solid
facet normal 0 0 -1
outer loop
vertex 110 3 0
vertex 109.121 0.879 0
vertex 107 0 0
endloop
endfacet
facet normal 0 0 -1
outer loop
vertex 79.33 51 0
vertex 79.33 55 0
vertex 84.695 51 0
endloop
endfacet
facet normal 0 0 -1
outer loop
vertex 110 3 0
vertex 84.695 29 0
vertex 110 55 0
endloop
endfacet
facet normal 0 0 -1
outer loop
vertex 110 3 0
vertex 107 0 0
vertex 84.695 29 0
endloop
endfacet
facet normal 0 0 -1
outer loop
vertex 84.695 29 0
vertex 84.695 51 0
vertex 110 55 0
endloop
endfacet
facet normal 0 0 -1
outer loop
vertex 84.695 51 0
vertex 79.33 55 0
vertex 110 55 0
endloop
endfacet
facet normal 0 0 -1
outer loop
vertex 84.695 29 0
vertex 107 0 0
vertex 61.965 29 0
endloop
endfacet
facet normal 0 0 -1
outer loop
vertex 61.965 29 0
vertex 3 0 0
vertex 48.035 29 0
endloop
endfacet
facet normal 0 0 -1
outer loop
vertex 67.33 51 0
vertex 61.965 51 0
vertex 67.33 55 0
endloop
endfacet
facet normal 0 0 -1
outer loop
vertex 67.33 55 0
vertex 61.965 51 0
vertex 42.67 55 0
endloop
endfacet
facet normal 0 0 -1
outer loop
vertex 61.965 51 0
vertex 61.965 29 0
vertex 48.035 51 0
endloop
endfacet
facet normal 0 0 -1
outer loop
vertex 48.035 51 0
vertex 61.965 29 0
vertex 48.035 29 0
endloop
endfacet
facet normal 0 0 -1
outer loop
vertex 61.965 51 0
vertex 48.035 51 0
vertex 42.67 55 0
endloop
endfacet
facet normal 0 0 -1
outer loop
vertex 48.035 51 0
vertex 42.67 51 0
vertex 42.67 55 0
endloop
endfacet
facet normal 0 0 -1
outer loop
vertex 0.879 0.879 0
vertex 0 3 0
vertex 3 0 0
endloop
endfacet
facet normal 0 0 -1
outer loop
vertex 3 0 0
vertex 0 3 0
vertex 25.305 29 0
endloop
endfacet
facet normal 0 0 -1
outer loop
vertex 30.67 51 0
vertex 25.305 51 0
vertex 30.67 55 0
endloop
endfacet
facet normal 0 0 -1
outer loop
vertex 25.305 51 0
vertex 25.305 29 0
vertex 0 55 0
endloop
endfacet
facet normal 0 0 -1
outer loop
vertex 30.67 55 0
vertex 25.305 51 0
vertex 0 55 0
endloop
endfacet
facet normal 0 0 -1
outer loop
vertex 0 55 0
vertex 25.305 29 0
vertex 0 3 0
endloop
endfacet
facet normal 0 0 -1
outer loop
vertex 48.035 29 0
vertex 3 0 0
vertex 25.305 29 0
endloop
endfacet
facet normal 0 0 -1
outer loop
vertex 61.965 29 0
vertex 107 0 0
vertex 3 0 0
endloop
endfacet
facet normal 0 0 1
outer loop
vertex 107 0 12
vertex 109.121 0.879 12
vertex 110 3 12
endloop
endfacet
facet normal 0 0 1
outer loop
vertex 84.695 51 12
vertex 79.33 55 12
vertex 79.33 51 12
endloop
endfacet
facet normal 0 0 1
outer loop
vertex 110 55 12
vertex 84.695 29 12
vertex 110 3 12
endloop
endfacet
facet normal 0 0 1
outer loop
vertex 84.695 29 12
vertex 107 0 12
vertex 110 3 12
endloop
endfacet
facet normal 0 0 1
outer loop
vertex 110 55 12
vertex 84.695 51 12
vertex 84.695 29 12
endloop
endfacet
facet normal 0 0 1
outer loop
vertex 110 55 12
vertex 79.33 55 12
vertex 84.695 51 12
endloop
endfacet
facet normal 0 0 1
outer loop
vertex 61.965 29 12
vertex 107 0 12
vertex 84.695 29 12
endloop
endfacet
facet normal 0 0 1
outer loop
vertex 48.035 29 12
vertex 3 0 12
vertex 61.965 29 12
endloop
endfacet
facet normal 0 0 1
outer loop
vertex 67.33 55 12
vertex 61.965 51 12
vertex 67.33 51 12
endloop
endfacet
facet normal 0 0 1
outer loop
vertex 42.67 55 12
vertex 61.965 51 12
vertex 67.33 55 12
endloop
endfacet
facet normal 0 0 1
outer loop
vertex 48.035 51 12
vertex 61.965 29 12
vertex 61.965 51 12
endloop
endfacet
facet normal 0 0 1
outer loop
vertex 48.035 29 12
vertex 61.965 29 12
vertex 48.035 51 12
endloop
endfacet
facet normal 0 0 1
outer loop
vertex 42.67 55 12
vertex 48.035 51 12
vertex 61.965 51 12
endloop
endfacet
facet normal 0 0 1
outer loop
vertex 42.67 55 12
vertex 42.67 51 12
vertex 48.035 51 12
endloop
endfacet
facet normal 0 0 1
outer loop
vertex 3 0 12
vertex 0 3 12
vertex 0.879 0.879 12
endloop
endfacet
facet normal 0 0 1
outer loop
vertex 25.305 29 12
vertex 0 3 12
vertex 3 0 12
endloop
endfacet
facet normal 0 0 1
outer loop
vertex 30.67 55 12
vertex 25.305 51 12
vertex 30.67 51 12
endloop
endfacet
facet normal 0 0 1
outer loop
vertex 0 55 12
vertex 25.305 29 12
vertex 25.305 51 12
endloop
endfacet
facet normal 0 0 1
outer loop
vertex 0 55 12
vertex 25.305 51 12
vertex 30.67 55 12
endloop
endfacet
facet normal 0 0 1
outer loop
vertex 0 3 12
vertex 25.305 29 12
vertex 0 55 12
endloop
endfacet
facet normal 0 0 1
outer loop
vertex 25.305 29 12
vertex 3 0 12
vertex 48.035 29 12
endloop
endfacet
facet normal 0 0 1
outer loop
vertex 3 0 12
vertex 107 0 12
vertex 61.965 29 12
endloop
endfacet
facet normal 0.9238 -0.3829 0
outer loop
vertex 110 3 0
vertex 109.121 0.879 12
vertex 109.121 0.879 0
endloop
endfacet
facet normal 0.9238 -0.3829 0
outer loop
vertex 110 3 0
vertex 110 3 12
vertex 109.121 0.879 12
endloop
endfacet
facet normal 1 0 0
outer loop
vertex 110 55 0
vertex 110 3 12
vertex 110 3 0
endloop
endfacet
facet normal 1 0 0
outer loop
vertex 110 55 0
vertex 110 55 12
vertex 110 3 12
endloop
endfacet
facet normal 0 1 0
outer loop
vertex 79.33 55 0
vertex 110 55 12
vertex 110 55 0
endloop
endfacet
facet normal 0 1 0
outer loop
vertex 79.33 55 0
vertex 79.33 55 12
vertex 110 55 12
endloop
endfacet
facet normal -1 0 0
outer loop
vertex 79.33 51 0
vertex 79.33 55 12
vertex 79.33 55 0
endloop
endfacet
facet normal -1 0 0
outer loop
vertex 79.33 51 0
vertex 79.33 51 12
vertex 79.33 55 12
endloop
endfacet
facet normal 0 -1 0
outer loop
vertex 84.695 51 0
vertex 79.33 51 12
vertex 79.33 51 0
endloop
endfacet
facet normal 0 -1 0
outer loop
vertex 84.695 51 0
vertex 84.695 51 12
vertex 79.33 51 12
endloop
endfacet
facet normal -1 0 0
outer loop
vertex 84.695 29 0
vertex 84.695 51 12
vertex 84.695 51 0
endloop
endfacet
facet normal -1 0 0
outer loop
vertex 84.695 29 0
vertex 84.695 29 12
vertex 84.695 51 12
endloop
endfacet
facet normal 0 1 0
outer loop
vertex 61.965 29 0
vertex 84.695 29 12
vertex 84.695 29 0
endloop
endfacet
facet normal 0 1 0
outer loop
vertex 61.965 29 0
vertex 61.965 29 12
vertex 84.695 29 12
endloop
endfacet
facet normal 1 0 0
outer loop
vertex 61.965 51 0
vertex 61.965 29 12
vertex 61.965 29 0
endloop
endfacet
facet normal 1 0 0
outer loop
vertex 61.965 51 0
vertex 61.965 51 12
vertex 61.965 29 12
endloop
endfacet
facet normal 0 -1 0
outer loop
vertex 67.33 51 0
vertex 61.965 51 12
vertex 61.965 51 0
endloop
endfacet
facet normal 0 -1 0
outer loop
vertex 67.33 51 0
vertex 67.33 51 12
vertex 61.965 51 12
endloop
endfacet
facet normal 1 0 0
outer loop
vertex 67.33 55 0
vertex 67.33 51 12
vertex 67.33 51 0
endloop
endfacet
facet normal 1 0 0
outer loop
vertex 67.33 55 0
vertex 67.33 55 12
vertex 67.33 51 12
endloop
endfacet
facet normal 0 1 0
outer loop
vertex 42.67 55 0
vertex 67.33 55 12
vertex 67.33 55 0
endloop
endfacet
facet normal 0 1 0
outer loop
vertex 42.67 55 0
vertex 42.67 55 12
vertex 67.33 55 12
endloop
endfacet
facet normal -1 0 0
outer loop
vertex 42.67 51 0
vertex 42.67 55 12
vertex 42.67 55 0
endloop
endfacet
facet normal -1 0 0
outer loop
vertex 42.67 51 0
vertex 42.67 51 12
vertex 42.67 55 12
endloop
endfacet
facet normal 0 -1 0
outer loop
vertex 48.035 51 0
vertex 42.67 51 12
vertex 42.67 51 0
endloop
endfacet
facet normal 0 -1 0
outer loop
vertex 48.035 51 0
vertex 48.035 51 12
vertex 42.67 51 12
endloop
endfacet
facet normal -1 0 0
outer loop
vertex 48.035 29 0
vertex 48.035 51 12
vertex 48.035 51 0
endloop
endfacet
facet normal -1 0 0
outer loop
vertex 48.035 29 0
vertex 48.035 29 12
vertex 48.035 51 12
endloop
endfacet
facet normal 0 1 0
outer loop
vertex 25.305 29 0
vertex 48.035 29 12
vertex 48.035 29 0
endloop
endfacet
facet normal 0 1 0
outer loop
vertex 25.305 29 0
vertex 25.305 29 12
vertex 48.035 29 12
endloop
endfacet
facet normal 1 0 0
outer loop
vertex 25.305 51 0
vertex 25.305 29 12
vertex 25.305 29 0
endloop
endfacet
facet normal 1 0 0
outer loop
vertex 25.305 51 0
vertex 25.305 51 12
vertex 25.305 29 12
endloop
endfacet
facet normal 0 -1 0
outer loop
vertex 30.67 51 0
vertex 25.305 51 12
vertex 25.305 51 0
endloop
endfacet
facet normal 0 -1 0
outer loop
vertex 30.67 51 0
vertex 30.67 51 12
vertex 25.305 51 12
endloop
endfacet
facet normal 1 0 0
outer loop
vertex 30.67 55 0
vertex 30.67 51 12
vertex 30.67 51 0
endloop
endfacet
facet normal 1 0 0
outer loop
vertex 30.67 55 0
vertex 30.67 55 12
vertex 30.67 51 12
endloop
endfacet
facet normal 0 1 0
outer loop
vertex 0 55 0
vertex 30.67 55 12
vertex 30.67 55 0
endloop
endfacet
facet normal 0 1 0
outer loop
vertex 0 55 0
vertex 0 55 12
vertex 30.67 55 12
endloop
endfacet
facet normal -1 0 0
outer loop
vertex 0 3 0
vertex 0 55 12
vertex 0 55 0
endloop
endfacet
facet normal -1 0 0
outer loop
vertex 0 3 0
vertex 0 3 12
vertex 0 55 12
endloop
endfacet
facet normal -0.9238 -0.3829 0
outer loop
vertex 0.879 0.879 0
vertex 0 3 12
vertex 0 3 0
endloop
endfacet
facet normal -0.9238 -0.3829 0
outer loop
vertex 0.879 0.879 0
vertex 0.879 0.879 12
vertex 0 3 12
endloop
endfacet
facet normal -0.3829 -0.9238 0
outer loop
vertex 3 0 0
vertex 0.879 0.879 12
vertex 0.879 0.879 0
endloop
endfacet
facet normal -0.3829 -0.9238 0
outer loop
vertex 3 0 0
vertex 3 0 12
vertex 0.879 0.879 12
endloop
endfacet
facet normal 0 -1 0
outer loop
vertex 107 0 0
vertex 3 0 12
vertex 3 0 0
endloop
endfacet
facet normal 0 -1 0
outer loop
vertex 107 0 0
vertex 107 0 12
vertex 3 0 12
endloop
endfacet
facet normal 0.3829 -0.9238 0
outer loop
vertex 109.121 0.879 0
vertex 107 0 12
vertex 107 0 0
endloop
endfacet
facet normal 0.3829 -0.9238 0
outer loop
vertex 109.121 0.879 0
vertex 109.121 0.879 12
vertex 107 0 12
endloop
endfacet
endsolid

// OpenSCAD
$fn = 32;

// ----------------------------------------------------------------------
// Window plate: 110 x 55 mm, 2 open windows
// ----------------------------------------------------------------------

// --- parameters (mm) ---
profile_height = 12;      // extrusion height
profile_points = 24;      // points of the closed outline

profile = [[0, 3], [0.879, 0.879], [3, 0], [107, 0], [109.121, 0.879], [110, 3], [110, 55], [79.33, 55], [79.33, 51], [84.695, 51], [84.695, 29], [61.965, 29], [61.965, 51], [67.33, 51], [67.33, 55], [42.67, 55], [42.67, 51], [48.035, 51], [48.035, 29], [25.305, 29], [25.305, 51], [30.67, 51], [30.67, 55], [0, 55]];  // single closed polygon, 24 points, counter clockwise

// --- the one profile operation ---
linear_extrude(height = profile_height) polygon(points = profile);
